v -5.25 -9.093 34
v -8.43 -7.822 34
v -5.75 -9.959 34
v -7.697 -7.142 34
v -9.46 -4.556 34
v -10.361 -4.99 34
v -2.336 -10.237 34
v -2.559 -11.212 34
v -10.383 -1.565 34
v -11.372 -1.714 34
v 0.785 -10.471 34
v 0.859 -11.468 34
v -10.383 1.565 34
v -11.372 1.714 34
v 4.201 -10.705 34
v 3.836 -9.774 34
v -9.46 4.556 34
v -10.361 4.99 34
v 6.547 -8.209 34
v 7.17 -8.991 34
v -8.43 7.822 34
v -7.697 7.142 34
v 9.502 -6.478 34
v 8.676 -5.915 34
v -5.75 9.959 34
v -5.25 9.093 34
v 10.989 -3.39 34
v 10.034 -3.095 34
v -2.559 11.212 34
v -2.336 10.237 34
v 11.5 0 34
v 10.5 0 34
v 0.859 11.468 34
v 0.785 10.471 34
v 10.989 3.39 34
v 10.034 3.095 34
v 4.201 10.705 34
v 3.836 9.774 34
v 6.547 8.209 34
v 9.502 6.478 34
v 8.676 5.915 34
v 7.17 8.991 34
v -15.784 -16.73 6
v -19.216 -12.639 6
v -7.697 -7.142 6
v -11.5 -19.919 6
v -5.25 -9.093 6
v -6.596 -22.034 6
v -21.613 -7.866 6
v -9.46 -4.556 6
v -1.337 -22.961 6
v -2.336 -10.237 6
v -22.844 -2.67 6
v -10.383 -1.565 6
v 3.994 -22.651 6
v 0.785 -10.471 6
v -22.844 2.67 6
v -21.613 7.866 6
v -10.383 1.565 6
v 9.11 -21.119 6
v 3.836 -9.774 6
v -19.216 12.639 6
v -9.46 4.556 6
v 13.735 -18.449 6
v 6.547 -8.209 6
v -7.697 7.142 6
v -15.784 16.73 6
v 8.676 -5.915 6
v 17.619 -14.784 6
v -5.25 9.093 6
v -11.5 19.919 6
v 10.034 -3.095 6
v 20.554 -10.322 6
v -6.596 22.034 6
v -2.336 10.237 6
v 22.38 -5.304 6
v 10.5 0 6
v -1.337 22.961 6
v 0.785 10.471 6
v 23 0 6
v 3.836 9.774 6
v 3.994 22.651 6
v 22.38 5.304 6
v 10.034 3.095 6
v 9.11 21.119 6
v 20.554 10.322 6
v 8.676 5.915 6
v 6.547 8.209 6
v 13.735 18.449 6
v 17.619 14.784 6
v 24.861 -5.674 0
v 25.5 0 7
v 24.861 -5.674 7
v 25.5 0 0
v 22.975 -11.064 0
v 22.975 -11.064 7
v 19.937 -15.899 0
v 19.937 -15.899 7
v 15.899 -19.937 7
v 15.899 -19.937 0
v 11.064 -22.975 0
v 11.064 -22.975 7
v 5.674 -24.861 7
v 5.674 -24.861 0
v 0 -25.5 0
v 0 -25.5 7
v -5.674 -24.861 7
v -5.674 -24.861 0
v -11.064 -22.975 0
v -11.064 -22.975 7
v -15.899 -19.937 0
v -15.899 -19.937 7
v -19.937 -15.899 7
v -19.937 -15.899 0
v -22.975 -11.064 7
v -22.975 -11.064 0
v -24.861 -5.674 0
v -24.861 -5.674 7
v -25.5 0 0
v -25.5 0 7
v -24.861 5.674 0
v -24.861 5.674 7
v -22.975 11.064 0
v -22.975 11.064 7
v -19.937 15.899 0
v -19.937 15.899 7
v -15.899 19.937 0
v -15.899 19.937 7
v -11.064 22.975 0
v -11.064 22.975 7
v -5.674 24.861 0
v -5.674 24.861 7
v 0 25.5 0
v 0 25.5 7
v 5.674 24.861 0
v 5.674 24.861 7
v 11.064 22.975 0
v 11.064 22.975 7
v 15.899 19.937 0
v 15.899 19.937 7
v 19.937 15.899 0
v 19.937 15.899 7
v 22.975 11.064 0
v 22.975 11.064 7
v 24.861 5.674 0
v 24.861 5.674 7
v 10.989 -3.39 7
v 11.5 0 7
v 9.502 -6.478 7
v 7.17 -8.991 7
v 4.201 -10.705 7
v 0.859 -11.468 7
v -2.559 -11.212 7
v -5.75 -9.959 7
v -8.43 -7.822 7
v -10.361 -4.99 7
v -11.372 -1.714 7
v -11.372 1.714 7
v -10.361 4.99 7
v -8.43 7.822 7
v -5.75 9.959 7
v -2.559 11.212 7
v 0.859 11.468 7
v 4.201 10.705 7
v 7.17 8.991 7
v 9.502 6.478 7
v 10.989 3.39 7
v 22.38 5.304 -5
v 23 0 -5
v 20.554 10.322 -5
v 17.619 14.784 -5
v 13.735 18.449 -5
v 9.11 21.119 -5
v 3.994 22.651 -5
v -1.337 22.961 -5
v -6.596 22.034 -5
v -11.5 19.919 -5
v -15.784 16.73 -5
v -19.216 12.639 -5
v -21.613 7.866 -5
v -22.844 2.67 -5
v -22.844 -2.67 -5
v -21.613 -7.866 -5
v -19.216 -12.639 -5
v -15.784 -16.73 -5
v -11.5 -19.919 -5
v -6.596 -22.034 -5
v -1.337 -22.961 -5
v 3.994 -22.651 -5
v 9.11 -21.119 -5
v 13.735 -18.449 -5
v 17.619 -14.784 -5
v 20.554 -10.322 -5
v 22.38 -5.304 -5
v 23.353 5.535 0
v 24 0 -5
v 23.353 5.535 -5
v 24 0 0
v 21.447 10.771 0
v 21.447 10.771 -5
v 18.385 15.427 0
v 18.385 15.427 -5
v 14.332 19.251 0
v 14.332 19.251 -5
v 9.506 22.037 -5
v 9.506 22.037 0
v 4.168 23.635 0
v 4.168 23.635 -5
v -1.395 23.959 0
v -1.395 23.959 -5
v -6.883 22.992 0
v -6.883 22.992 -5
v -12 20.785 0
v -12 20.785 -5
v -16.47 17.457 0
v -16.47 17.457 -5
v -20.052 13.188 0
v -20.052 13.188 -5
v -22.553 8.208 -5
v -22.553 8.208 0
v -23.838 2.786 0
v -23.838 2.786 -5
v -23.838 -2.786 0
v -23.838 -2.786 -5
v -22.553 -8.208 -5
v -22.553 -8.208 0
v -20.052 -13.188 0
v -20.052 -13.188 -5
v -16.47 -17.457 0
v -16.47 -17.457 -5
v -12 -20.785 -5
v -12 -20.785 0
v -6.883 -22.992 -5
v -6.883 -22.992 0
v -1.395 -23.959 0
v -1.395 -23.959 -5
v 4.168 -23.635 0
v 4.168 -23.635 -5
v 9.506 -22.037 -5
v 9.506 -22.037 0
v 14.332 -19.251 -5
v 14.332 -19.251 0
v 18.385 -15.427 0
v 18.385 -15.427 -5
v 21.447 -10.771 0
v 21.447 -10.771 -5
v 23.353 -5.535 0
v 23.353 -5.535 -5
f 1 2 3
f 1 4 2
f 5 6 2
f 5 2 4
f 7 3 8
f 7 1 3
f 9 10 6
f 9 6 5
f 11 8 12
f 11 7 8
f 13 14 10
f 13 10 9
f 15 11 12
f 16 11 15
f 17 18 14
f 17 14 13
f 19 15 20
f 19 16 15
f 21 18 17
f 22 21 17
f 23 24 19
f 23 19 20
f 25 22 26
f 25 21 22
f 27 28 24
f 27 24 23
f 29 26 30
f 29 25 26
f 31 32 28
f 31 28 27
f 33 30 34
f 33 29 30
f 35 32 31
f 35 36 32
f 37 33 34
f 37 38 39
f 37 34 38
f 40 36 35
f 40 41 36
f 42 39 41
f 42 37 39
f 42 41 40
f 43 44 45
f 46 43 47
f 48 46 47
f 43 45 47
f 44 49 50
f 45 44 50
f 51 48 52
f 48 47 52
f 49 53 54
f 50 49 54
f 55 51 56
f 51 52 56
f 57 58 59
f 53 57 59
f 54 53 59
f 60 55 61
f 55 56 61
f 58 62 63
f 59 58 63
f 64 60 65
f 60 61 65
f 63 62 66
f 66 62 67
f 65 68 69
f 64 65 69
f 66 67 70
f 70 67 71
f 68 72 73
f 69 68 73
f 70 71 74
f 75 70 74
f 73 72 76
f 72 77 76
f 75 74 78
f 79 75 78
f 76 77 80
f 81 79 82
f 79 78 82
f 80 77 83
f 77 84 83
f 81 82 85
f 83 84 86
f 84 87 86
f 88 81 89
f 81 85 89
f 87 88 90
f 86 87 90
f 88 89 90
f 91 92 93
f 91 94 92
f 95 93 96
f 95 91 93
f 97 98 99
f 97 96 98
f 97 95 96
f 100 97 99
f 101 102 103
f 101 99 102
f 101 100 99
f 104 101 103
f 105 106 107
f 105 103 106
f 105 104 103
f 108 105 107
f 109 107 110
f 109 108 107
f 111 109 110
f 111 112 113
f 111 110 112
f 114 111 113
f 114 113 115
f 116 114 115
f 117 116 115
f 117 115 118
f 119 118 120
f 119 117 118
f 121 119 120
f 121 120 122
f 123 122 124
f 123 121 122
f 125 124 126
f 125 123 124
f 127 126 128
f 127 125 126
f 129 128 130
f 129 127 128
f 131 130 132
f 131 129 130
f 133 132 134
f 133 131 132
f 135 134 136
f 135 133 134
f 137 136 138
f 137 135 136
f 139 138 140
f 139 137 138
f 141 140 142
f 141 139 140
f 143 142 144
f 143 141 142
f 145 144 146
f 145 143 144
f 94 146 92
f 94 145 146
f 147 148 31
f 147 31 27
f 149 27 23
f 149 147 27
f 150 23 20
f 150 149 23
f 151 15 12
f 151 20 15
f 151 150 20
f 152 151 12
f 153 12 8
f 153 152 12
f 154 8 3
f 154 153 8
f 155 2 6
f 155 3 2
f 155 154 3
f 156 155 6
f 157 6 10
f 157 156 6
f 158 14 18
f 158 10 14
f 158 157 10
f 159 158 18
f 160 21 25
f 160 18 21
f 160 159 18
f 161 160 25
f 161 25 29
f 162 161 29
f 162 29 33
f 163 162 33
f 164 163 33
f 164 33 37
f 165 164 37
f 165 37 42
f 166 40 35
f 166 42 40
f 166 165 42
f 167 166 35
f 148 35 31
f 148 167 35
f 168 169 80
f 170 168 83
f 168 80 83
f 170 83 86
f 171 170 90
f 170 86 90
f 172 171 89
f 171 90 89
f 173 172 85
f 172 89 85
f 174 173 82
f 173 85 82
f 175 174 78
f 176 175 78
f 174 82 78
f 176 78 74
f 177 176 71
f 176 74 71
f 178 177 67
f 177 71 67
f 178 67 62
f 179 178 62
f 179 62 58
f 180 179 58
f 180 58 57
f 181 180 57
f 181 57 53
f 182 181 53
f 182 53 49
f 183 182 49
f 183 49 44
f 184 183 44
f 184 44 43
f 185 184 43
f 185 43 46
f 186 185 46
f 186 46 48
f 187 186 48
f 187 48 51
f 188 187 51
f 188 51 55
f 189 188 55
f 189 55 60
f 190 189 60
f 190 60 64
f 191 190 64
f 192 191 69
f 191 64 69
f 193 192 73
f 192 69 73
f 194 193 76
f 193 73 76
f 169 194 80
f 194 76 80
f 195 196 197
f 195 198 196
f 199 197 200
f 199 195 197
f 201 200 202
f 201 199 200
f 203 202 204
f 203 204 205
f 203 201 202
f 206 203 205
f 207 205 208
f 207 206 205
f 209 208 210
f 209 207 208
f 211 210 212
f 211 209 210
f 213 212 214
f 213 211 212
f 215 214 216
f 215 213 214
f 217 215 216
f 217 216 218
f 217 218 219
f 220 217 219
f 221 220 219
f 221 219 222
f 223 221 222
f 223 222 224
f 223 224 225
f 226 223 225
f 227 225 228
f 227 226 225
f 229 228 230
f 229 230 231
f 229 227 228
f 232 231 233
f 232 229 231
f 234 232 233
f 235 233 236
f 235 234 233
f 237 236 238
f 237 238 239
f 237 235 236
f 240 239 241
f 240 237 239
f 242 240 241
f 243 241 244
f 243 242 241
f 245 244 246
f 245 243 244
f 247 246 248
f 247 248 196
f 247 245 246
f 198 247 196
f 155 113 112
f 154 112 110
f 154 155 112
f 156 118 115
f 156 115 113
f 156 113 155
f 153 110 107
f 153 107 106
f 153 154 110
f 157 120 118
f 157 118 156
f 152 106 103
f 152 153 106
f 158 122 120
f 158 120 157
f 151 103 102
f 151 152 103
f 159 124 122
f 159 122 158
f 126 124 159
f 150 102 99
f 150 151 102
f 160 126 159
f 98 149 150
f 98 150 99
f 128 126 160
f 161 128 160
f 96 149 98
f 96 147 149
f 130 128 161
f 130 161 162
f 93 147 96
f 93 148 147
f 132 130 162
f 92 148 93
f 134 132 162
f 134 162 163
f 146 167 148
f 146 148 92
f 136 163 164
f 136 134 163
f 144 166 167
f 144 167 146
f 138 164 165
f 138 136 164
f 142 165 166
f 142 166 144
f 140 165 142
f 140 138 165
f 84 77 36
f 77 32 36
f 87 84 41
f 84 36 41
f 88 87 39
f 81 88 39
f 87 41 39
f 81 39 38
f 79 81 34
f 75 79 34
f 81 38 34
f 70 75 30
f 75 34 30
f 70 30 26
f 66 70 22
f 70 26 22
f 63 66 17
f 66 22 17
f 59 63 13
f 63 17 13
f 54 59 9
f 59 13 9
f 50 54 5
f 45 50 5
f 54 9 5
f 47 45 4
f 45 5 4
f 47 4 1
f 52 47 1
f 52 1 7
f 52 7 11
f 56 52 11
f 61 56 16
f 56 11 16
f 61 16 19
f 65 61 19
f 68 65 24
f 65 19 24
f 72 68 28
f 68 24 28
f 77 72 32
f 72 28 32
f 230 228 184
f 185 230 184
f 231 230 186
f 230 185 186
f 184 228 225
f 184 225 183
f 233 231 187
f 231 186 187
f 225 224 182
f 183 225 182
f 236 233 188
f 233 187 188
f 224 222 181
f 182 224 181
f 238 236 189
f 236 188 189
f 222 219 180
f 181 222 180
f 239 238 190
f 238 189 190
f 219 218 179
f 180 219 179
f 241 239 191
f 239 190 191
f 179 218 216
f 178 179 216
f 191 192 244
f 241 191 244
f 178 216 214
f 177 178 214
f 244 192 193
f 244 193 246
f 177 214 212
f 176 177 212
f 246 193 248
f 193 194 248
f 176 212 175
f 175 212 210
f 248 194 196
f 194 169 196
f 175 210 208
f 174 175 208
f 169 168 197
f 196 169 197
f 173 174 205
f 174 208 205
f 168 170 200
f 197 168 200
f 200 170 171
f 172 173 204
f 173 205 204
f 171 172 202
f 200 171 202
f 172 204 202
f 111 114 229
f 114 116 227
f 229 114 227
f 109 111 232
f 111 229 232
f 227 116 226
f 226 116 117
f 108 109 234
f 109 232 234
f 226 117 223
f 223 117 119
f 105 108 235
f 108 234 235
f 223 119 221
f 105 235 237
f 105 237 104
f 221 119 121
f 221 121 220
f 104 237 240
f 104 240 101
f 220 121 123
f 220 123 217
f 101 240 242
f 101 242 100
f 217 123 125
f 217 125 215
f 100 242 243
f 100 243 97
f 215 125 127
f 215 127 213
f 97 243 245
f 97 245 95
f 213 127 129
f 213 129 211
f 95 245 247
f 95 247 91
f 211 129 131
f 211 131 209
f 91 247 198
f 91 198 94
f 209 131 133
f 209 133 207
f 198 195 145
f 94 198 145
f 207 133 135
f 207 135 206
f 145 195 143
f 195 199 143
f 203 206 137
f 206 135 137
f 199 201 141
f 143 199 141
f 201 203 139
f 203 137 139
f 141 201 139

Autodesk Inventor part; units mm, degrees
ref_plane "YZ Plane" through (0, 0, 0) normal (1, 0, 0) x (0, 1, 0)
ref_plane "XZ Plane" through (0, 0, 0) normal (0, 1, 0) x (-1, 0, 0)
ref_plane "XY Plane" through (0, 0, 0) normal (0, 0, 1) x (1, 0, 0)
ref_plane "Plano de trabalho1" through (0, 0, 0) normal (0, 0, 1) x (1, 0, 0)
sketch "Esboço1" plane through (0, 0, 0) normal (0, 0, 1) x (1, 0, 0)
  circle A0 centre (0, 0) radius 24 projected
  circle A1 centre (0, 0) radius 23
  point P0 (0, 0)
  dimension "d0" = 1
extrude "Extrusão1" add sketch "Esboço1" against normal blind 5
sketch "Esboço2" plane through (0, 0, 0) normal (0, 0, 1) x (1, 0, 0)
  circle A0 centre (0, 0) radius 23 projected
  circle A1 centre (0, 0) radius 25.5
  point P0 (0, 0)
  dimension "d3" = 2.5
extrude "Extrusão2" add sketch "Esboço2" along normal blind 7
sketch "Esboço3" plane through (0, 0, 7) normal (0, 0, 1) x (1, 0, 0)
  circle A0 centre (0, 0) radius 23 projected
  point P0 (0, 0)
extrude "Extrusão3" add sketch "Esboço3" against normal blind 1
sketch "Esboço4" plane through (0, 0, 7) normal (0, 0, 1) x (1, 0, 0)
  circle A0 centre (0, 0) radius 11.5
  dimension "d8" = 23
extrude "Extrusão4" add sketch "Esboço4" along normal blind 27
sketch "Esboço5" plane through (0, 0, 34) normal (0, 0, 1) x (1, 0, 0)
  circle A0 centre (0, 0) radius 11.5 projected
  circle A1 centre (0, 0) radius 10.5
  dimension "d11" = 1
extrude "Extrusão5" cut sketch "Esboço5" against normal through all contours A1
properties part number "Bocal de Saída"
